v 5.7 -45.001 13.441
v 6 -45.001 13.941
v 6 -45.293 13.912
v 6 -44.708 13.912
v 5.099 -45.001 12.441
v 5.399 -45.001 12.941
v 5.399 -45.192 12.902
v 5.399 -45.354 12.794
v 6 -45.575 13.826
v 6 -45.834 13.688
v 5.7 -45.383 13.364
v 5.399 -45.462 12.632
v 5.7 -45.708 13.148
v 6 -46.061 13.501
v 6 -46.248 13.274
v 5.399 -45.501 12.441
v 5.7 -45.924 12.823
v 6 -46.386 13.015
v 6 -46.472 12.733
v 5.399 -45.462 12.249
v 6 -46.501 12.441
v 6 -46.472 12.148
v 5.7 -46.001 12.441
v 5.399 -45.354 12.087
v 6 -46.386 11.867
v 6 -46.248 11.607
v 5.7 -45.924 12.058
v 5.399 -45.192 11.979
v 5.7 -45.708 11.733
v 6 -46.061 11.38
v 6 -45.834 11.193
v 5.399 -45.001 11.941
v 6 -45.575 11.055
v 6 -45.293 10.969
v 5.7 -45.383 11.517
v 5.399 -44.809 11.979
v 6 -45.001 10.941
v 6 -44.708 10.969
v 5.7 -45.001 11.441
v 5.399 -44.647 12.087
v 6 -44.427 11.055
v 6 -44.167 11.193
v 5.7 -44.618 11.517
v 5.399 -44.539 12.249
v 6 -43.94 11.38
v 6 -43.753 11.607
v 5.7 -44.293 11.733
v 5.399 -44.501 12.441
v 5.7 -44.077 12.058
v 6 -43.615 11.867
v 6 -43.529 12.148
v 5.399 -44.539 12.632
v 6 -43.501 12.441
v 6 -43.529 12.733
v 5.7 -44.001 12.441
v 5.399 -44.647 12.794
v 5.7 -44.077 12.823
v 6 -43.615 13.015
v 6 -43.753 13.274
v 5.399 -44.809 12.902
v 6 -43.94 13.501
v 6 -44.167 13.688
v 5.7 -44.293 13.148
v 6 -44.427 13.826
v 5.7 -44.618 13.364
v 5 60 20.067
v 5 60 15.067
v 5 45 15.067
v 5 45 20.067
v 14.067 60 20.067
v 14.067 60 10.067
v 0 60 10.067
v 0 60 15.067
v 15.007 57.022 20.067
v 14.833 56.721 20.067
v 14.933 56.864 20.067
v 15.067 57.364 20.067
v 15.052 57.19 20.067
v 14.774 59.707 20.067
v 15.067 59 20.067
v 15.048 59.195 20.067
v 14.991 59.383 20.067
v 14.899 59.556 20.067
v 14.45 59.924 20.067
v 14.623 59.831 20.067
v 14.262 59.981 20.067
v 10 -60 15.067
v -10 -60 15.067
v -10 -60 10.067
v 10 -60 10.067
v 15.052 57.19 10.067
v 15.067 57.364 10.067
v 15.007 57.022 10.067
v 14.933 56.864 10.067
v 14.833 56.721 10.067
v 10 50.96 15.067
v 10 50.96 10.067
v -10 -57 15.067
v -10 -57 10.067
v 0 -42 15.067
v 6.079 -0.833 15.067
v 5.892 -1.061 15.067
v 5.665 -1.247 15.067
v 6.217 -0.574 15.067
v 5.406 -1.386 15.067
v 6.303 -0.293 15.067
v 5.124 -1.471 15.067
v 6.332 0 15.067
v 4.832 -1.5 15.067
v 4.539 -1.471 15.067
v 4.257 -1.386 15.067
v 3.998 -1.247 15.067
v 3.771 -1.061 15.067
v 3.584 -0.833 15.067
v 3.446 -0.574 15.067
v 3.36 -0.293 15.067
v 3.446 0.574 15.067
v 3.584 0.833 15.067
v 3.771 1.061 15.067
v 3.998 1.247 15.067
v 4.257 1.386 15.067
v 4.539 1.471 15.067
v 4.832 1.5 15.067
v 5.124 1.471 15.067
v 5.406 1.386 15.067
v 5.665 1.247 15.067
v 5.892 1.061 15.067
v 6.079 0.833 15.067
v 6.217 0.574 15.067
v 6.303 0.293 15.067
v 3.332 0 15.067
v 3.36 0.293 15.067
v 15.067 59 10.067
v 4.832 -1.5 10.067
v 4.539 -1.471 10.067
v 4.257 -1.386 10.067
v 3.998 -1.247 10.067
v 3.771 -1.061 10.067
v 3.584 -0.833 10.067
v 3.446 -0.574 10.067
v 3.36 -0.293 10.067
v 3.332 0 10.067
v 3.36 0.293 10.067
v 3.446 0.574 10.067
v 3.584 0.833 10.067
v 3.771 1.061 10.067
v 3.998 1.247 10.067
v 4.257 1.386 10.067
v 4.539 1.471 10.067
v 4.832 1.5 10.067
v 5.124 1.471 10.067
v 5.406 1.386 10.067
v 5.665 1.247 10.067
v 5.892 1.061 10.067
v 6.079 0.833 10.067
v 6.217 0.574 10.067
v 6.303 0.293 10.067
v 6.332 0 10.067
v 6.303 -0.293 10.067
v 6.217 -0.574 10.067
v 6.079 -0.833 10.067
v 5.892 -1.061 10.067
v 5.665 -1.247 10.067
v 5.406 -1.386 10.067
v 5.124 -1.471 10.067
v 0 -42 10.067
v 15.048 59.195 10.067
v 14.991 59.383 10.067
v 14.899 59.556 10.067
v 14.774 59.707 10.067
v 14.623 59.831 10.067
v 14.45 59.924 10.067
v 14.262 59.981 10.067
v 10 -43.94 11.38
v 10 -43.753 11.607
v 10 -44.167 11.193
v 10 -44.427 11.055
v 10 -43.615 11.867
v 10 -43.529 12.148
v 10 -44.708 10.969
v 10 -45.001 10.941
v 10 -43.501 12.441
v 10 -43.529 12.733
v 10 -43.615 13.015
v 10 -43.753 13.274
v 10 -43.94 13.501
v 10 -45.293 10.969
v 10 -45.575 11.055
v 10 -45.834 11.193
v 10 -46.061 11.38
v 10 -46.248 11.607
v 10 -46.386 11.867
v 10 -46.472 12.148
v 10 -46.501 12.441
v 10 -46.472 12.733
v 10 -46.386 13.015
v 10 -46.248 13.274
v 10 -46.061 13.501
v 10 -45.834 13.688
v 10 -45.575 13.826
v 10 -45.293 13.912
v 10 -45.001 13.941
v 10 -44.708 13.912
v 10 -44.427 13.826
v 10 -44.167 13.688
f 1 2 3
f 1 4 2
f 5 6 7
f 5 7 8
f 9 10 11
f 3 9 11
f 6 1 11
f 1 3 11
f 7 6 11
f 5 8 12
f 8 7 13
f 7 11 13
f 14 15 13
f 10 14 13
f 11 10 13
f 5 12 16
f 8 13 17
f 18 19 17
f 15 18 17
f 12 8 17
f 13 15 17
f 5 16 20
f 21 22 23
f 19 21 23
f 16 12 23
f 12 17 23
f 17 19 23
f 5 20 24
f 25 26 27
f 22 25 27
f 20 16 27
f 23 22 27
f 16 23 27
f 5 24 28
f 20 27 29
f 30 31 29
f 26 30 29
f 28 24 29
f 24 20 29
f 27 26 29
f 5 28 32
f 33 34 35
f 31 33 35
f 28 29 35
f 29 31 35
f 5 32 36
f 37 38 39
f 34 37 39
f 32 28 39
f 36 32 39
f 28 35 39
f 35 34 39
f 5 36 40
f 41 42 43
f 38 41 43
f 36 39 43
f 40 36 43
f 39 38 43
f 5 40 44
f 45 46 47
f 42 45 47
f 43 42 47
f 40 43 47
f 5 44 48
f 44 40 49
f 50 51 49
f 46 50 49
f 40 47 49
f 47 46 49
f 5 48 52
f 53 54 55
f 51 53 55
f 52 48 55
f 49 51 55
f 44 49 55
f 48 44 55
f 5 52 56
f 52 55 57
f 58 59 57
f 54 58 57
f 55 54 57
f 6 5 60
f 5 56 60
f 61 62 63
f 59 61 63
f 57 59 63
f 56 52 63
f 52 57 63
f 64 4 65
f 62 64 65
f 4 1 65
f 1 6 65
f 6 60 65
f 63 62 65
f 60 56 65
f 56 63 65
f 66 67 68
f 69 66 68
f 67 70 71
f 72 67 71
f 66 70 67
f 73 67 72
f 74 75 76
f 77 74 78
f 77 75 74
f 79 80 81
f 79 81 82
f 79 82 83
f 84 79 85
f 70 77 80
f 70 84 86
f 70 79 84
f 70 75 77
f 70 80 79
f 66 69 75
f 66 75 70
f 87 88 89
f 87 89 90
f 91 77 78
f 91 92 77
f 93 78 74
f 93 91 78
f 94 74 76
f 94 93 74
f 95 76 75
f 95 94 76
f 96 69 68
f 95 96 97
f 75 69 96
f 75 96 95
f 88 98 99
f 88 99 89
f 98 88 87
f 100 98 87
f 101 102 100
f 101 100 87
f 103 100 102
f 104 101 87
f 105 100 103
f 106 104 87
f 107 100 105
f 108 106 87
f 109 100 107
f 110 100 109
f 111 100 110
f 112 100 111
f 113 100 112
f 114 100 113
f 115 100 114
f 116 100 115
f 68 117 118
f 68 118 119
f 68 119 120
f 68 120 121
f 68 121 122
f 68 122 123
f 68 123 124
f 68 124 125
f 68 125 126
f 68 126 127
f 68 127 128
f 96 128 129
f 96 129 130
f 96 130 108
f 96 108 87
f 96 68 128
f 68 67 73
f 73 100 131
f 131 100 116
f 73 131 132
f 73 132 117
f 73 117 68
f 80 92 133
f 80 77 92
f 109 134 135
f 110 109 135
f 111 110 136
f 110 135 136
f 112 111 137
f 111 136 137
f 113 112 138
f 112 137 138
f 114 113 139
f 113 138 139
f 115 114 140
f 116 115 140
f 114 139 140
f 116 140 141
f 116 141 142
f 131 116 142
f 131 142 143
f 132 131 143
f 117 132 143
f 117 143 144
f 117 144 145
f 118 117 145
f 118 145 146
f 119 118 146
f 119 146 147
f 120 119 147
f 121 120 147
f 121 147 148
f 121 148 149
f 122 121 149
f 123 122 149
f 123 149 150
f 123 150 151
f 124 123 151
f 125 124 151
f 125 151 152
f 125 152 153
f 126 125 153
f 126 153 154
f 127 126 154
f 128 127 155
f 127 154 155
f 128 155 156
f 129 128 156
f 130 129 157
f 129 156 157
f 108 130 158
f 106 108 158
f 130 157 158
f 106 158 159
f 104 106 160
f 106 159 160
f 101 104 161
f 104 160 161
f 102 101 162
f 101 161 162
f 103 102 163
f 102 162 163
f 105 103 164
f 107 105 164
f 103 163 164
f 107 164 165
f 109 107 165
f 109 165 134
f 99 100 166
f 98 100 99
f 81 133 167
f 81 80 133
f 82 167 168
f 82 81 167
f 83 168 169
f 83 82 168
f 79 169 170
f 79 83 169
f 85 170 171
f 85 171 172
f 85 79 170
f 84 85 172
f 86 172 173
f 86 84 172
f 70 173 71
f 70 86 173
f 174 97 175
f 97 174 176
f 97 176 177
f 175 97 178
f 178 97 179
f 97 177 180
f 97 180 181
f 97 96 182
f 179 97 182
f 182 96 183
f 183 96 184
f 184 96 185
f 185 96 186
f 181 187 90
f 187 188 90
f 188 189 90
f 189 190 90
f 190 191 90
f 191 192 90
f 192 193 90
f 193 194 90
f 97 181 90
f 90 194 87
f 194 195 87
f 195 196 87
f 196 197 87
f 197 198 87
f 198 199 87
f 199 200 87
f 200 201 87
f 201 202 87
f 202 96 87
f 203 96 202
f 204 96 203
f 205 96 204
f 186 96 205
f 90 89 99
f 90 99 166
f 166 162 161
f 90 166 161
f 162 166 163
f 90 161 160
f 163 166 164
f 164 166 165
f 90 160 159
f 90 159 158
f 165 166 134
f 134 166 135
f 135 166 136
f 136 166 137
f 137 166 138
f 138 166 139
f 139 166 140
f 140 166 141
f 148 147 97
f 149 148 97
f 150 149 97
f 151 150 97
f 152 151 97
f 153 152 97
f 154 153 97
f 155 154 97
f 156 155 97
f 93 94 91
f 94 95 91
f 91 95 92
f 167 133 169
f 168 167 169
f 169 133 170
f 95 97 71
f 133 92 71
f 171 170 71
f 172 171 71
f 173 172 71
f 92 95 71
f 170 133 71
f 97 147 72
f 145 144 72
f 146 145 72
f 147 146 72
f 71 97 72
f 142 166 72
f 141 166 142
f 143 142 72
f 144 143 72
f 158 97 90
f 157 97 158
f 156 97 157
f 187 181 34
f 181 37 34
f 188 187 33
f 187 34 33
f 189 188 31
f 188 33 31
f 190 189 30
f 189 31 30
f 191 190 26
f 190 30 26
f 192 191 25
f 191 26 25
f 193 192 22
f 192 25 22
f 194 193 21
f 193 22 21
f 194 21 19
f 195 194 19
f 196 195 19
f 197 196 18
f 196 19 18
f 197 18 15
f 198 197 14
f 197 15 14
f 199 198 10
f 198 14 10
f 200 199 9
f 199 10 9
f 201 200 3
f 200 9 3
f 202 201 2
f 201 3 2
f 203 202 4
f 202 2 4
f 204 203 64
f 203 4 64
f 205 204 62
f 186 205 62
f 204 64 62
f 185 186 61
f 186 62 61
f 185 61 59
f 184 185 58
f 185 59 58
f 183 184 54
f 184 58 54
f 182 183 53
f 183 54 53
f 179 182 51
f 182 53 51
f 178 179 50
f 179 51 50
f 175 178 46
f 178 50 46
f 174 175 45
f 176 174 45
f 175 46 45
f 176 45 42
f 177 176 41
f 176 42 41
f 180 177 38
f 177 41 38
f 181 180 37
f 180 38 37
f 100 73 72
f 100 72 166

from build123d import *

# Parameters (mm, degrees)
F0_W      = 60
F0_H      = 10
F1_DEPTH  = 5
F4_DEPTH  = 5
F6_DEPTH  = 5
F7_DEPTH  = 5
F9_D      = 3
F11_R     = 1
F13_D     = 3
F13_DEPTH = 4
F13_TIP   = 0.9012909285
F14_ANGLE = -90


with BuildPart() as f1:
    # F0 (on Right) → F1 (new body)
    with BuildSketch(Plane.YZ):
        with Locations((30, 10.0670714118)):
            Rectangle(F0_W, F0_H)
    extrude(amount=-F1_DEPTH)

    # F2: F1 across plane


with BuildPart() as f1_1:
    add(f1.part)
    add(f1.part.mirror(Plane.XZ))

    # F3 (on Right) → F4 (join)
    with BuildSketch(Plane.YZ):
        Polygon((-60, 25.0670714118), (-60, 15.0670714118), (-42, 15.0670714118), (-57, 25.0670714118), align=None)
    extrude(amount=-F4_DEPTH)

    # F9 (through all)
    with Locations(Plane.YZ):
        with Locations((0, 10.2355619892)):
            Hole(F9_D / 2)


with BuildPart() as f6:
    # F5 (on face) → F6 (new body)
    with BuildSketch(Plane.YZ):
        Polygon((57, 0), (60, 0), (60, 10.0670714118), (45, 10.0670714118), align=None)
    extrude(amount=F6_DEPTH)


with BuildPart() as f7:
    # F5 (on face) → F7 (new body)
    with BuildSketch(Plane.YZ):
        Polygon((57, 0), (60, 0), (60, 10.0670714118), (45, 10.0670714118), align=None)
    extrude(amount=-F7_DEPTH)


with BuildPart() as f1_2:
    add(f1_1.part)

    # F10: union F6, F7
    add(f6.part)
    add(f7.part)

    # F11
    f11_edges = [f1_2.edges().sort_by_distance(p)[0] for p in [
        (0, 57, 0),
        (0, 60, 0),
    ]]
    fillet(f11_edges, radius=F11_R)

    # F13
    with Locations(Plane(origin=(0, 0, 5.0670714118), x_dir=(1, 0, 0), z_dir=(0, 0, -1))):
        with Locations((-2.6265240659, 45.0005336208)):
            Hole(F13_D / 2, depth=F13_DEPTH)
            with Locations((0, 0, -(F13_DEPTH + F13_TIP / 2))):  # 118° drill point
                Cone(0, F13_D / 2, F13_TIP, mode=Mode.SUBTRACT)


with BuildPart() as f1_3:
    # F14: moved
    add(f1_2.part.rotate(Axis((0, 9, 15.0670714118), (0, 1, 0)), F14_ANGLE))


solid = f1_3.part
